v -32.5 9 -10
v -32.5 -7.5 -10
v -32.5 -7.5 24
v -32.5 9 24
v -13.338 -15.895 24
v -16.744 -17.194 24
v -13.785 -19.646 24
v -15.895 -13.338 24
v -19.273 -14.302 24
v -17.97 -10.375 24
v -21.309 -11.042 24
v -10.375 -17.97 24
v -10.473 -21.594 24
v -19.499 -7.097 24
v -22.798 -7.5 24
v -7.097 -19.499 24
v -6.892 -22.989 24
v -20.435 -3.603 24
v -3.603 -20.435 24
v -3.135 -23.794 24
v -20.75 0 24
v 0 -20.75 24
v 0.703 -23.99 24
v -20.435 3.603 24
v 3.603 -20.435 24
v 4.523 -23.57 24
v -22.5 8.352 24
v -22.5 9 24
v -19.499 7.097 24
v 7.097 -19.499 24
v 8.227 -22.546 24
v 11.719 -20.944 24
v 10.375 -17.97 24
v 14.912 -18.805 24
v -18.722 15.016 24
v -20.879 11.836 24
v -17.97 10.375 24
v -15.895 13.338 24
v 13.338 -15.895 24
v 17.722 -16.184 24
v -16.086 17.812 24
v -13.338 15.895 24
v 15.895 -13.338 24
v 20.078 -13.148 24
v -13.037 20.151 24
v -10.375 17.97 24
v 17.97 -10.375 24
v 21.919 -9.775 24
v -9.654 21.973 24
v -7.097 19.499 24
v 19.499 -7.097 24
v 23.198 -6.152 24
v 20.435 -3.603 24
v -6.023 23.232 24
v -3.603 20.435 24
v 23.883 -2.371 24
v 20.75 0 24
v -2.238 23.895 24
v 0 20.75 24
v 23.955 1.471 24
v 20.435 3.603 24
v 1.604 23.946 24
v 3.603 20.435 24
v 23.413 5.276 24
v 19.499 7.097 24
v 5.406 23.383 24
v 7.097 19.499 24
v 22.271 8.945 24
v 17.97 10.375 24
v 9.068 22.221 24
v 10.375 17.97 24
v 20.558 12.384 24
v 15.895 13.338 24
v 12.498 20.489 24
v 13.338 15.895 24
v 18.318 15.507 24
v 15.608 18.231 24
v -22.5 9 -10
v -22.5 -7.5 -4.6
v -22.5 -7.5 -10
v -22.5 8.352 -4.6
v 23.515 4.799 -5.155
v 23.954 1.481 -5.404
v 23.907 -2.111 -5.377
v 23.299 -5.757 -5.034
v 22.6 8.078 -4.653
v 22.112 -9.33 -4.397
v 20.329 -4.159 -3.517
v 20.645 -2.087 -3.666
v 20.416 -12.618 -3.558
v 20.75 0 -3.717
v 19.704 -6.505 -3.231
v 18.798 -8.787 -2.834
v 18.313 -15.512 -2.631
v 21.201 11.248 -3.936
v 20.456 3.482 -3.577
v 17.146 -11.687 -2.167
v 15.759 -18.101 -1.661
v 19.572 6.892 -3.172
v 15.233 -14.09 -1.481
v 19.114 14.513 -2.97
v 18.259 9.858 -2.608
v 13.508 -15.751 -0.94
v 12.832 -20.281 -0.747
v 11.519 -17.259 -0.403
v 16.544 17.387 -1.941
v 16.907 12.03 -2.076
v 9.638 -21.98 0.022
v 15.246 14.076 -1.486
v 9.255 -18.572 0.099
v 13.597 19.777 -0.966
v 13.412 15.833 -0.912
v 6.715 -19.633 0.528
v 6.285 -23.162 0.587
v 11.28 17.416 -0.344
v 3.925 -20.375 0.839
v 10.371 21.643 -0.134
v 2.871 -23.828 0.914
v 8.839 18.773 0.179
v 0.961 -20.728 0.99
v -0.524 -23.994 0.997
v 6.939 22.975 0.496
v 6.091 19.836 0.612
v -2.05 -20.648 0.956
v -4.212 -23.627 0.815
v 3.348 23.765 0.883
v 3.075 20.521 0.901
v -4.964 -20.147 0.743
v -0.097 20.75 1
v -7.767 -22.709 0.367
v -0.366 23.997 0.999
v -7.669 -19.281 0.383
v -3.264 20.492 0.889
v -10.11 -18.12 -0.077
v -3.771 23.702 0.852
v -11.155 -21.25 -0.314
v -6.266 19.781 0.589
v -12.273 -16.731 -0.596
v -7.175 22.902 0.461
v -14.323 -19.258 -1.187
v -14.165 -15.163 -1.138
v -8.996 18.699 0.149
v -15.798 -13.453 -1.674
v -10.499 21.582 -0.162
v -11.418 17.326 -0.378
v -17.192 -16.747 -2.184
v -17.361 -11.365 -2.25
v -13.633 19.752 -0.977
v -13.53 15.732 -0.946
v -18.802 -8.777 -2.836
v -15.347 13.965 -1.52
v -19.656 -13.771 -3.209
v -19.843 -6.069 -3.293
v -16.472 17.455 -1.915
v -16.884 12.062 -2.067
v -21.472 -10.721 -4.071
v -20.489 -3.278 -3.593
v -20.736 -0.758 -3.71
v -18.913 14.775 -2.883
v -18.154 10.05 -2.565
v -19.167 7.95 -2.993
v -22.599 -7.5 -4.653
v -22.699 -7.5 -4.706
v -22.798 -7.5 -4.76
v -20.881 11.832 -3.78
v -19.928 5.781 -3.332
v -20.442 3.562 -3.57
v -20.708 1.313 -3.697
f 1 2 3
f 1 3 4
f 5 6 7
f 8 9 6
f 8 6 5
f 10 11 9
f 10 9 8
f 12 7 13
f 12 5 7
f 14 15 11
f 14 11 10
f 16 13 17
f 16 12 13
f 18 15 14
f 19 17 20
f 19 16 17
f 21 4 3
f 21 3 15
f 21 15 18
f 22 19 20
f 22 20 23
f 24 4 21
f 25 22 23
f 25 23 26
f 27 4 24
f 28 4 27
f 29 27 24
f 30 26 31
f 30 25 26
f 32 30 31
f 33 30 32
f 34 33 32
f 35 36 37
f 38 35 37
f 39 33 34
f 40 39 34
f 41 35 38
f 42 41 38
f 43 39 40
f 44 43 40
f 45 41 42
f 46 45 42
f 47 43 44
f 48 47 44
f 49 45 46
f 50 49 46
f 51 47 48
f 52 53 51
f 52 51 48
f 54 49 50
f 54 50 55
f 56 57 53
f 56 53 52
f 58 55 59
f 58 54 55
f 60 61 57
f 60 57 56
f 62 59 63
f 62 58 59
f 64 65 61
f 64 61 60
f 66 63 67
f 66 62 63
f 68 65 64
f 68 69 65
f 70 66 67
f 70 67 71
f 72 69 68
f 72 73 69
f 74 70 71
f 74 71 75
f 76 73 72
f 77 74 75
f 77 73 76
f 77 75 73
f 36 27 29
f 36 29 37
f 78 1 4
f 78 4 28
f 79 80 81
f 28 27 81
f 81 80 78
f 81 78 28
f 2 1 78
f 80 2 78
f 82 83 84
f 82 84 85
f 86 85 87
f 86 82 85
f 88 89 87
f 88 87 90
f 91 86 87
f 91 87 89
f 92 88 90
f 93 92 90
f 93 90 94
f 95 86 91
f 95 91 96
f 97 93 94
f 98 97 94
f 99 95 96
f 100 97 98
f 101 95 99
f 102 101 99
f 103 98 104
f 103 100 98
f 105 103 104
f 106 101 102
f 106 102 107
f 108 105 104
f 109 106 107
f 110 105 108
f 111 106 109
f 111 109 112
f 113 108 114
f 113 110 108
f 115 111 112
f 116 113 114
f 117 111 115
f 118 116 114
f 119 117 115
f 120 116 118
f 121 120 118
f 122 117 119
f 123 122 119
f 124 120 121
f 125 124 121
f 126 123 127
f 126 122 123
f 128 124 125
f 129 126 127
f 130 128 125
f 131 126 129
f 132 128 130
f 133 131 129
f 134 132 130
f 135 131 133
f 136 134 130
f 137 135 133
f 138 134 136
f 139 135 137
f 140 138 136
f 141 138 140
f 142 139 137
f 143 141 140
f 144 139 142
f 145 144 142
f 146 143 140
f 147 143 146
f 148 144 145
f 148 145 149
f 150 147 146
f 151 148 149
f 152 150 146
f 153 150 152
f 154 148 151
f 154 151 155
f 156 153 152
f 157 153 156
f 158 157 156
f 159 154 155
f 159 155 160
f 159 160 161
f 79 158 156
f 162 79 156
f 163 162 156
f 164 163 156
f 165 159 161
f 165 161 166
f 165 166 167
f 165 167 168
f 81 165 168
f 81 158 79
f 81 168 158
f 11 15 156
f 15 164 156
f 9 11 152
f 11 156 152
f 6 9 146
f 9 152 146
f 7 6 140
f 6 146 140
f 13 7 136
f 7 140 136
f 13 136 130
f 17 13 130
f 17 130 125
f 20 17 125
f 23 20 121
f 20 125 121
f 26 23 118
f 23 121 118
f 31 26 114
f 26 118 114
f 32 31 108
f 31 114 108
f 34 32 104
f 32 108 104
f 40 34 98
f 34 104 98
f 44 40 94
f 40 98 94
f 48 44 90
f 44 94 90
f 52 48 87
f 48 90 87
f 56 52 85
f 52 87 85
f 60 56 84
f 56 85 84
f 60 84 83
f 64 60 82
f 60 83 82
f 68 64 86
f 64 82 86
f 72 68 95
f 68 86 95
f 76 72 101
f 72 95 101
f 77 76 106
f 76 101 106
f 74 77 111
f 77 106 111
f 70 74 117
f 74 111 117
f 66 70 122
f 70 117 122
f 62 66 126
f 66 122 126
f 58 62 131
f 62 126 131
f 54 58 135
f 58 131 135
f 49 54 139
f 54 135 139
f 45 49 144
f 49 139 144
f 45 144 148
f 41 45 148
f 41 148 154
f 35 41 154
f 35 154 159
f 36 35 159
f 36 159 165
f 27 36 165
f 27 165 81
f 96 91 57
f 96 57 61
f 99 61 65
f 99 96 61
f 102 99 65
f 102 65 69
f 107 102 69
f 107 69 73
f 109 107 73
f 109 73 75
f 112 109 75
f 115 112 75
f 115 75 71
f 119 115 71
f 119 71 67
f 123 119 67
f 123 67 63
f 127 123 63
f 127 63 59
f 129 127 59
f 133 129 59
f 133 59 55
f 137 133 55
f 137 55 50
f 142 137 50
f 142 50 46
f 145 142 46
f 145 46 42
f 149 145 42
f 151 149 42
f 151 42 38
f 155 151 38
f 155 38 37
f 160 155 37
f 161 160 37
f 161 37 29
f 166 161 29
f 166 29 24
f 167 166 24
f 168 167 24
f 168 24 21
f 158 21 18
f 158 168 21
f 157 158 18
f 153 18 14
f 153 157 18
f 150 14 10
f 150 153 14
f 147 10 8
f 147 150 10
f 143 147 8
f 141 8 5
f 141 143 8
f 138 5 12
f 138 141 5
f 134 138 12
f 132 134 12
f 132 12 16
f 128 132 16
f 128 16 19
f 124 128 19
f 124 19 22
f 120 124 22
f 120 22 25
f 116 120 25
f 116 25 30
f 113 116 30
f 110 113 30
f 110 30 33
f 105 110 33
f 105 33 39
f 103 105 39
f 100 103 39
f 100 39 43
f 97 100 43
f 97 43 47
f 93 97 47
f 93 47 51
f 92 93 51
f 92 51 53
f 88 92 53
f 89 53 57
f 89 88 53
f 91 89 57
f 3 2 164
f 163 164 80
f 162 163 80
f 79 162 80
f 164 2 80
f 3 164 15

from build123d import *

# Parameters (mm, degrees)
BOX002_W               = 10
BOX002_H               = 16.5
BOX002_DEPTH           = 34
CYLINDER009_R          = 20.75
CYLINDER009_DEPTH      = 150
CYLINDER014_R          = 48
CYLINDER014_DEPTH      = 245
CYLINDER014_ROLL_ANGLE = 90
CYLINDER013_R          = 24
CYLINDER013_DEPTH      = 56


with BuildPart() as cubo_externo_para_riel_de_enfocador:
    # Box002 → Box002 (new body)
    with BuildSketch(Plane(origin=(-32.5, -7.5, -10), x_dir=(1, 0, 0), z_dir=(0, 0, 1))):
        with Locations((5, 8.25)):
            Rectangle(BOX002_W, BOX002_H)
    extrude(amount=BOX002_DEPTH)


with BuildPart() as cylinder009:
    # Cylinder009 → Cylinder009 (new body)
    with BuildSketch(Plane.XY.offset(-32)):
        Circle(CYLINDER009_R)
    extrude(amount=CYLINDER009_DEPTH)


with BuildPart() as cylinder014:
    # Cylinder014 → Cylinder014 (new body)
    with BuildSketch(Plane.XY):
        Circle(CYLINDER014_R)
    extrude(amount=CYLINDER014_DEPTH)


with BuildPart() as cylinder014_1:
    # Cylinder014 roll: moved
    add(cylinder014.part.rotate(Axis((0, 0, 0), (1, 0, 0)), CYLINDER014_ROLL_ANGLE))


with BuildPart() as cylinder014_2:
    # Cylinder014 placement: moved
    add(cylinder014_1.part.moved(Location((0, 79, -47))))


with BuildPart() as fusion009:
    # Cylinder013 → Cylinder013 (new body)
    with BuildSketch(Plane.XY.offset(-32)):
        Circle(CYLINDER013_R)
    extrude(amount=CYLINDER013_DEPTH)

    # Cut008: cut Cylinder014
    add(cylinder014_2.part, mode=Mode.SUBTRACT)

    # Cut009: cut Cylinder009
    add(cylinder009.part, mode=Mode.SUBTRACT)

    # Fusion009: union Cubo externo para riel de enfocador
    add(cubo_externo_para_riel_de_enfocador.part)


solid = fusion009.part
